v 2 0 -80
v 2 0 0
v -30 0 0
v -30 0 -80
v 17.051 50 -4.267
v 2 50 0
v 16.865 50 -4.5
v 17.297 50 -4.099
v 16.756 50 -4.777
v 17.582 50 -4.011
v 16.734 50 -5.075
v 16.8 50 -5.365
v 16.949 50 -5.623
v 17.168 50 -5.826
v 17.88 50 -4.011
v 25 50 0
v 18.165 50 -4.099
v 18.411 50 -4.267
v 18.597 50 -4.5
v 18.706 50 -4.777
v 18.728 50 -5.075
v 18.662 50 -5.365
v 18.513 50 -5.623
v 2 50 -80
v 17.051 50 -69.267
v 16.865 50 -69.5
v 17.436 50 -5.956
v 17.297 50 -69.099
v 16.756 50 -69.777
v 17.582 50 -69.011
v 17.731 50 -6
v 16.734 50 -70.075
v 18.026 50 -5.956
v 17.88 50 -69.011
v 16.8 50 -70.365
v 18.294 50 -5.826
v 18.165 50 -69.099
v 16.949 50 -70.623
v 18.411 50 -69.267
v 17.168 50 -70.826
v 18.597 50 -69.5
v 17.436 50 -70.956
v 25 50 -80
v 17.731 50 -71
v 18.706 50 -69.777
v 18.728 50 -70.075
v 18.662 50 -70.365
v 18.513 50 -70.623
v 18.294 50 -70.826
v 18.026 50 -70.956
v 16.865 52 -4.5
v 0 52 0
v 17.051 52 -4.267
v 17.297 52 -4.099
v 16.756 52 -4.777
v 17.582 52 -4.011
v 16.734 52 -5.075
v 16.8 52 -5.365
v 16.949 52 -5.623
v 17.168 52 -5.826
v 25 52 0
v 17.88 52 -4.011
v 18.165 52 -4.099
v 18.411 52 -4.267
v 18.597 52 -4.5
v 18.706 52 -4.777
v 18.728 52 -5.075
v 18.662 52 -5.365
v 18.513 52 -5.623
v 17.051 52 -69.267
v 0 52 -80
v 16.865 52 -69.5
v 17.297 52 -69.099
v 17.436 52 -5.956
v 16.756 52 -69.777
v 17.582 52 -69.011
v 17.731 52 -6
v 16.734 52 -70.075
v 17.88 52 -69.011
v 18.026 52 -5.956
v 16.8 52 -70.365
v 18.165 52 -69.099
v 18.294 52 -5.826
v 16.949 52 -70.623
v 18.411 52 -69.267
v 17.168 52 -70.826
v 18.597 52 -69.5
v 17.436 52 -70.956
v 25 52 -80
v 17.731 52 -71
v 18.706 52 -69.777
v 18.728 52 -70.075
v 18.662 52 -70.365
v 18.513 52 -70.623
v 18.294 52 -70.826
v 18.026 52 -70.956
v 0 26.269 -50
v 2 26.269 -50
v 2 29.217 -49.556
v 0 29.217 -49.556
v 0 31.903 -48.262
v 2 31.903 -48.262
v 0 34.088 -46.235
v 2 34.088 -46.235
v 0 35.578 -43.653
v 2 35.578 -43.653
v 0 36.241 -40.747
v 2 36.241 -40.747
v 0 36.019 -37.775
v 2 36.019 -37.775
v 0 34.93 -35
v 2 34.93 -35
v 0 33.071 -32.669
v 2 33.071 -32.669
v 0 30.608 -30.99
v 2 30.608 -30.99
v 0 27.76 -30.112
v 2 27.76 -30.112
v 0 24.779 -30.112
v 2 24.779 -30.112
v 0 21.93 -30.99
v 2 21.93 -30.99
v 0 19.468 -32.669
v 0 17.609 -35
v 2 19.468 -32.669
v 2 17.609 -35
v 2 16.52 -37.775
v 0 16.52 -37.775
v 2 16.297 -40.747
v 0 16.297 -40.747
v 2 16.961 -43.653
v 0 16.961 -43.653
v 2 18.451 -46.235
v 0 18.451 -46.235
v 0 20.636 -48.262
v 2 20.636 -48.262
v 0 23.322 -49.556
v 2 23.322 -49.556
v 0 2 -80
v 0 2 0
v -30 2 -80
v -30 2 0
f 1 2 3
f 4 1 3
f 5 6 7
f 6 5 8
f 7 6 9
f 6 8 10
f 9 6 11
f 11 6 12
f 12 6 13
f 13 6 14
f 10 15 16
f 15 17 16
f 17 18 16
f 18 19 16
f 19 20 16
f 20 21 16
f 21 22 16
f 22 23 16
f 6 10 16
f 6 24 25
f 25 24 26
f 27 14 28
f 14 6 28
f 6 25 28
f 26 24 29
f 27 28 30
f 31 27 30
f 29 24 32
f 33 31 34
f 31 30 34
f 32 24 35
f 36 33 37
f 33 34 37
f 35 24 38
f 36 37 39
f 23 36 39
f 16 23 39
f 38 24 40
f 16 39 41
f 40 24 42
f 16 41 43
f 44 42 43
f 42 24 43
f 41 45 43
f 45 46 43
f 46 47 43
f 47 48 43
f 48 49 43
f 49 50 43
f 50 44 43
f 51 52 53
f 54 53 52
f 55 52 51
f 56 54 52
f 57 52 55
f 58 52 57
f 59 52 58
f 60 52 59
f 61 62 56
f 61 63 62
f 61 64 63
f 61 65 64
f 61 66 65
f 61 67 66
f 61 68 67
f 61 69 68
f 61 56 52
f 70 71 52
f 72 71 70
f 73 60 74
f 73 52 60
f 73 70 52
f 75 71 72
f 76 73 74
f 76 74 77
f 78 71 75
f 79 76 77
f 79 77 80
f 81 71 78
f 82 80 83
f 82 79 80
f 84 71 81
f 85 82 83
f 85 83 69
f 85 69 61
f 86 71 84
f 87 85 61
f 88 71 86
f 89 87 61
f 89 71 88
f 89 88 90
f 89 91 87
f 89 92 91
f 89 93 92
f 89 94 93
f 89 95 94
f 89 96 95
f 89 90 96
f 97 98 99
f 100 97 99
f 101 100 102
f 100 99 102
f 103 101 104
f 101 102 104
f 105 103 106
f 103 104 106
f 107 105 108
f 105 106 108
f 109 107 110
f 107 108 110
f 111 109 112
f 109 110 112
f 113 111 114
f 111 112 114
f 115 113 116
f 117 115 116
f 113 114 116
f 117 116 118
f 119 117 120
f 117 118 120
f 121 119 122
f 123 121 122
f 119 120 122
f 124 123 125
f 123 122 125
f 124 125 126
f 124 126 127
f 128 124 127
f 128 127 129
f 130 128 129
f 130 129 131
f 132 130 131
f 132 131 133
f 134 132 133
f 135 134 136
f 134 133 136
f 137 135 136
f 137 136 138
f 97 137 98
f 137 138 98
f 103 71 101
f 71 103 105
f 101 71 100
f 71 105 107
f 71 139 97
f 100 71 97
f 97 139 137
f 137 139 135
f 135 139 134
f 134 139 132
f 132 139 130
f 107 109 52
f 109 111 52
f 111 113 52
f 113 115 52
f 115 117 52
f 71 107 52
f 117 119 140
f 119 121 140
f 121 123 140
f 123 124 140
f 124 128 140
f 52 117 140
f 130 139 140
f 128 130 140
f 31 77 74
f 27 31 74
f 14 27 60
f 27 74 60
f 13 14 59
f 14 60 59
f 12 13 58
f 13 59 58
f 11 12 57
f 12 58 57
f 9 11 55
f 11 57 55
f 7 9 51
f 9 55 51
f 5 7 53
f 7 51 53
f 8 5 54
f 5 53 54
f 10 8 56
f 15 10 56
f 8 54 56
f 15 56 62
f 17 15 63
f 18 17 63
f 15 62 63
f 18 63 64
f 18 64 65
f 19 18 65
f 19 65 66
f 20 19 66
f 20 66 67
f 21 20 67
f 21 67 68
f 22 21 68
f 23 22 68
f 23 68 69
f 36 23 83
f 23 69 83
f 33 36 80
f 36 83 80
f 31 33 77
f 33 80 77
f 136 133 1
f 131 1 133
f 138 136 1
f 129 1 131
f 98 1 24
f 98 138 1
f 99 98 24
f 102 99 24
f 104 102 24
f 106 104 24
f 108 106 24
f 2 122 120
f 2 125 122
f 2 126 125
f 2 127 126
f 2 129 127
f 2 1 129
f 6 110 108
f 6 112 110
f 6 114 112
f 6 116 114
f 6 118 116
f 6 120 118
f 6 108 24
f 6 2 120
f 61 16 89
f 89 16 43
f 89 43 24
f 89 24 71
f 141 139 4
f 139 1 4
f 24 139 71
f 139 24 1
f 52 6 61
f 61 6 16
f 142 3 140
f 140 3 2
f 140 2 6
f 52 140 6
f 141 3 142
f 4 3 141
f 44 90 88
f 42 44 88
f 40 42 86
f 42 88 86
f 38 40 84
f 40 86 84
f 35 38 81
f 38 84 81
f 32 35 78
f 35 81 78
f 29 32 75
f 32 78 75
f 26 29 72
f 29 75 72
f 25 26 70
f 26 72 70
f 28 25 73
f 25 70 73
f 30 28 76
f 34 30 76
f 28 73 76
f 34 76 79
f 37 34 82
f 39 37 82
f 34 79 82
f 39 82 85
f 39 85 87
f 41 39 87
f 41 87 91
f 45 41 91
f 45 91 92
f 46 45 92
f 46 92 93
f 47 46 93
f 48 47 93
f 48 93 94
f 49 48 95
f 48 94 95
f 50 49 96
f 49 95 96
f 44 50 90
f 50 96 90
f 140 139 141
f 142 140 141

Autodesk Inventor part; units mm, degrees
ref_plane "YZ Plane" through (0, 0, 0) normal (1, 0, 0) x (0, 1, 0)
ref_plane "XZ Plane" through (0, 0, 0) normal (0, 1, 0) x (-1, 0, 0)
ref_plane "XY Plane" through (0, 0, 0) normal (0, 0, 1) x (1, 0, 0)
sketch "Sketch1" plane through (0, 0, 0) normal (0, 1, 0) x (-1, 0, 0)
  line L0 (0, 0) -> (30, 0)
  line L1 (30, 0) -> (30, -80)
  line L2 (30, -80) -> (0, -80)
  line L3 (0, -80) -> (0, 0)
  dimension "d0" = 30
  dimension "d1" = 80
extrude "Extrusion1" add sketch "Sketch1" along normal blind 2
sketch "Sketch2" plane through (0, 0, 0) normal (0, 0, 1) x (1, 0, 0)
  point P0 (0, 0)
sketch "Sketch3" plane through (0, 0, 0) normal (1, 0, 0) x (0, 1, 0)
  line L0 (0, 0) -> (50, 0)
  line L1 (50, 0) -> (50, -80)
  line L2 (50, -80) -> (0, -80)
  line L3 (0, -80) -> (0, 0)
  dimension "d4" = 50
  dimension "d11" = 80
extrude "Extrusion2" add sketch "Sketch3" along normal blind 2
sketch "Sketch4" plane through (0, 0, 0) normal (0, 1, 0) x (-1, 0, 0)
  point P0 (0, 0)
sketch "Sketch5" plane through (0, 0, 0) normal (-1, 0, 0) x (0, 0, 1)
  point P0 (0, 0)
sketch "Sketch6" plane through (0, 50, 0) normal (0, 1, 0) x (1, 0, 0)
  line L0 (-30, 0) -> (0, 0) projected
  line L1 (0, 0) -> (25, 0)
  line L2 (25, 0) -> (25, 80)
  line L3 (25, 80) -> (0, 80)
  line L4 (0, 80) -> (0, 0)
  dimension "d7" = 25
  dimension "d8" = 80
extrude "Extrusion3" add sketch "Sketch6" along normal blind 2
sketch "Sketch7" plane through (0, 2, 0) normal (0, 1, 0) x (1, 0, 0)
  point P0 (0, 0)
  point P1 (-20.3201, 56.529)
  point P2 (-18.421, 5.5073)
sketch "Sketch8" plane through (0, 0, 0) normal (0, -1, 0) x (1, 0, 0)
  point P0 (0, 0)
sketch "Sketch9" plane through (0, 50, 0) normal (0, -1, 0) x (1, 0, 0)
  line L0 (2, -80) -> (2, 0) projected
  line L1 (2, 0) -> (25, 0) projected
  line L2 (25, -80) -> (2, -80) projected
  point P0 (0, 0)
  point P1 (2, -65)
  point P2 (2, 0)
  point P3 (17.7309, -70)
  point P4 (17.7309, 0)
  point P5 (17.7309, -70)
  point P6 (17.7309, -5)
  dimension "d12" = 10
hole "Hole1" at (17.7309, 50, -70) at (17.7309, 50, -5) direction (0, 1, 0) diameter 2 depth 25 tip angle 118
sketch "Sketch10" plane through (2, 0, 0) normal (1, 0, 0) x (0, 0, -1)
  circle A0 centre (40, 26.2693) radius 10
  line L0 (80, 0) -> (80, 50) projected
  point P0 (0, 0)
  dimension "d20" = 20
  dimension "d21" = 40
extrude "Extrusion4" cut sketch "Sketch10" against normal blind 2
